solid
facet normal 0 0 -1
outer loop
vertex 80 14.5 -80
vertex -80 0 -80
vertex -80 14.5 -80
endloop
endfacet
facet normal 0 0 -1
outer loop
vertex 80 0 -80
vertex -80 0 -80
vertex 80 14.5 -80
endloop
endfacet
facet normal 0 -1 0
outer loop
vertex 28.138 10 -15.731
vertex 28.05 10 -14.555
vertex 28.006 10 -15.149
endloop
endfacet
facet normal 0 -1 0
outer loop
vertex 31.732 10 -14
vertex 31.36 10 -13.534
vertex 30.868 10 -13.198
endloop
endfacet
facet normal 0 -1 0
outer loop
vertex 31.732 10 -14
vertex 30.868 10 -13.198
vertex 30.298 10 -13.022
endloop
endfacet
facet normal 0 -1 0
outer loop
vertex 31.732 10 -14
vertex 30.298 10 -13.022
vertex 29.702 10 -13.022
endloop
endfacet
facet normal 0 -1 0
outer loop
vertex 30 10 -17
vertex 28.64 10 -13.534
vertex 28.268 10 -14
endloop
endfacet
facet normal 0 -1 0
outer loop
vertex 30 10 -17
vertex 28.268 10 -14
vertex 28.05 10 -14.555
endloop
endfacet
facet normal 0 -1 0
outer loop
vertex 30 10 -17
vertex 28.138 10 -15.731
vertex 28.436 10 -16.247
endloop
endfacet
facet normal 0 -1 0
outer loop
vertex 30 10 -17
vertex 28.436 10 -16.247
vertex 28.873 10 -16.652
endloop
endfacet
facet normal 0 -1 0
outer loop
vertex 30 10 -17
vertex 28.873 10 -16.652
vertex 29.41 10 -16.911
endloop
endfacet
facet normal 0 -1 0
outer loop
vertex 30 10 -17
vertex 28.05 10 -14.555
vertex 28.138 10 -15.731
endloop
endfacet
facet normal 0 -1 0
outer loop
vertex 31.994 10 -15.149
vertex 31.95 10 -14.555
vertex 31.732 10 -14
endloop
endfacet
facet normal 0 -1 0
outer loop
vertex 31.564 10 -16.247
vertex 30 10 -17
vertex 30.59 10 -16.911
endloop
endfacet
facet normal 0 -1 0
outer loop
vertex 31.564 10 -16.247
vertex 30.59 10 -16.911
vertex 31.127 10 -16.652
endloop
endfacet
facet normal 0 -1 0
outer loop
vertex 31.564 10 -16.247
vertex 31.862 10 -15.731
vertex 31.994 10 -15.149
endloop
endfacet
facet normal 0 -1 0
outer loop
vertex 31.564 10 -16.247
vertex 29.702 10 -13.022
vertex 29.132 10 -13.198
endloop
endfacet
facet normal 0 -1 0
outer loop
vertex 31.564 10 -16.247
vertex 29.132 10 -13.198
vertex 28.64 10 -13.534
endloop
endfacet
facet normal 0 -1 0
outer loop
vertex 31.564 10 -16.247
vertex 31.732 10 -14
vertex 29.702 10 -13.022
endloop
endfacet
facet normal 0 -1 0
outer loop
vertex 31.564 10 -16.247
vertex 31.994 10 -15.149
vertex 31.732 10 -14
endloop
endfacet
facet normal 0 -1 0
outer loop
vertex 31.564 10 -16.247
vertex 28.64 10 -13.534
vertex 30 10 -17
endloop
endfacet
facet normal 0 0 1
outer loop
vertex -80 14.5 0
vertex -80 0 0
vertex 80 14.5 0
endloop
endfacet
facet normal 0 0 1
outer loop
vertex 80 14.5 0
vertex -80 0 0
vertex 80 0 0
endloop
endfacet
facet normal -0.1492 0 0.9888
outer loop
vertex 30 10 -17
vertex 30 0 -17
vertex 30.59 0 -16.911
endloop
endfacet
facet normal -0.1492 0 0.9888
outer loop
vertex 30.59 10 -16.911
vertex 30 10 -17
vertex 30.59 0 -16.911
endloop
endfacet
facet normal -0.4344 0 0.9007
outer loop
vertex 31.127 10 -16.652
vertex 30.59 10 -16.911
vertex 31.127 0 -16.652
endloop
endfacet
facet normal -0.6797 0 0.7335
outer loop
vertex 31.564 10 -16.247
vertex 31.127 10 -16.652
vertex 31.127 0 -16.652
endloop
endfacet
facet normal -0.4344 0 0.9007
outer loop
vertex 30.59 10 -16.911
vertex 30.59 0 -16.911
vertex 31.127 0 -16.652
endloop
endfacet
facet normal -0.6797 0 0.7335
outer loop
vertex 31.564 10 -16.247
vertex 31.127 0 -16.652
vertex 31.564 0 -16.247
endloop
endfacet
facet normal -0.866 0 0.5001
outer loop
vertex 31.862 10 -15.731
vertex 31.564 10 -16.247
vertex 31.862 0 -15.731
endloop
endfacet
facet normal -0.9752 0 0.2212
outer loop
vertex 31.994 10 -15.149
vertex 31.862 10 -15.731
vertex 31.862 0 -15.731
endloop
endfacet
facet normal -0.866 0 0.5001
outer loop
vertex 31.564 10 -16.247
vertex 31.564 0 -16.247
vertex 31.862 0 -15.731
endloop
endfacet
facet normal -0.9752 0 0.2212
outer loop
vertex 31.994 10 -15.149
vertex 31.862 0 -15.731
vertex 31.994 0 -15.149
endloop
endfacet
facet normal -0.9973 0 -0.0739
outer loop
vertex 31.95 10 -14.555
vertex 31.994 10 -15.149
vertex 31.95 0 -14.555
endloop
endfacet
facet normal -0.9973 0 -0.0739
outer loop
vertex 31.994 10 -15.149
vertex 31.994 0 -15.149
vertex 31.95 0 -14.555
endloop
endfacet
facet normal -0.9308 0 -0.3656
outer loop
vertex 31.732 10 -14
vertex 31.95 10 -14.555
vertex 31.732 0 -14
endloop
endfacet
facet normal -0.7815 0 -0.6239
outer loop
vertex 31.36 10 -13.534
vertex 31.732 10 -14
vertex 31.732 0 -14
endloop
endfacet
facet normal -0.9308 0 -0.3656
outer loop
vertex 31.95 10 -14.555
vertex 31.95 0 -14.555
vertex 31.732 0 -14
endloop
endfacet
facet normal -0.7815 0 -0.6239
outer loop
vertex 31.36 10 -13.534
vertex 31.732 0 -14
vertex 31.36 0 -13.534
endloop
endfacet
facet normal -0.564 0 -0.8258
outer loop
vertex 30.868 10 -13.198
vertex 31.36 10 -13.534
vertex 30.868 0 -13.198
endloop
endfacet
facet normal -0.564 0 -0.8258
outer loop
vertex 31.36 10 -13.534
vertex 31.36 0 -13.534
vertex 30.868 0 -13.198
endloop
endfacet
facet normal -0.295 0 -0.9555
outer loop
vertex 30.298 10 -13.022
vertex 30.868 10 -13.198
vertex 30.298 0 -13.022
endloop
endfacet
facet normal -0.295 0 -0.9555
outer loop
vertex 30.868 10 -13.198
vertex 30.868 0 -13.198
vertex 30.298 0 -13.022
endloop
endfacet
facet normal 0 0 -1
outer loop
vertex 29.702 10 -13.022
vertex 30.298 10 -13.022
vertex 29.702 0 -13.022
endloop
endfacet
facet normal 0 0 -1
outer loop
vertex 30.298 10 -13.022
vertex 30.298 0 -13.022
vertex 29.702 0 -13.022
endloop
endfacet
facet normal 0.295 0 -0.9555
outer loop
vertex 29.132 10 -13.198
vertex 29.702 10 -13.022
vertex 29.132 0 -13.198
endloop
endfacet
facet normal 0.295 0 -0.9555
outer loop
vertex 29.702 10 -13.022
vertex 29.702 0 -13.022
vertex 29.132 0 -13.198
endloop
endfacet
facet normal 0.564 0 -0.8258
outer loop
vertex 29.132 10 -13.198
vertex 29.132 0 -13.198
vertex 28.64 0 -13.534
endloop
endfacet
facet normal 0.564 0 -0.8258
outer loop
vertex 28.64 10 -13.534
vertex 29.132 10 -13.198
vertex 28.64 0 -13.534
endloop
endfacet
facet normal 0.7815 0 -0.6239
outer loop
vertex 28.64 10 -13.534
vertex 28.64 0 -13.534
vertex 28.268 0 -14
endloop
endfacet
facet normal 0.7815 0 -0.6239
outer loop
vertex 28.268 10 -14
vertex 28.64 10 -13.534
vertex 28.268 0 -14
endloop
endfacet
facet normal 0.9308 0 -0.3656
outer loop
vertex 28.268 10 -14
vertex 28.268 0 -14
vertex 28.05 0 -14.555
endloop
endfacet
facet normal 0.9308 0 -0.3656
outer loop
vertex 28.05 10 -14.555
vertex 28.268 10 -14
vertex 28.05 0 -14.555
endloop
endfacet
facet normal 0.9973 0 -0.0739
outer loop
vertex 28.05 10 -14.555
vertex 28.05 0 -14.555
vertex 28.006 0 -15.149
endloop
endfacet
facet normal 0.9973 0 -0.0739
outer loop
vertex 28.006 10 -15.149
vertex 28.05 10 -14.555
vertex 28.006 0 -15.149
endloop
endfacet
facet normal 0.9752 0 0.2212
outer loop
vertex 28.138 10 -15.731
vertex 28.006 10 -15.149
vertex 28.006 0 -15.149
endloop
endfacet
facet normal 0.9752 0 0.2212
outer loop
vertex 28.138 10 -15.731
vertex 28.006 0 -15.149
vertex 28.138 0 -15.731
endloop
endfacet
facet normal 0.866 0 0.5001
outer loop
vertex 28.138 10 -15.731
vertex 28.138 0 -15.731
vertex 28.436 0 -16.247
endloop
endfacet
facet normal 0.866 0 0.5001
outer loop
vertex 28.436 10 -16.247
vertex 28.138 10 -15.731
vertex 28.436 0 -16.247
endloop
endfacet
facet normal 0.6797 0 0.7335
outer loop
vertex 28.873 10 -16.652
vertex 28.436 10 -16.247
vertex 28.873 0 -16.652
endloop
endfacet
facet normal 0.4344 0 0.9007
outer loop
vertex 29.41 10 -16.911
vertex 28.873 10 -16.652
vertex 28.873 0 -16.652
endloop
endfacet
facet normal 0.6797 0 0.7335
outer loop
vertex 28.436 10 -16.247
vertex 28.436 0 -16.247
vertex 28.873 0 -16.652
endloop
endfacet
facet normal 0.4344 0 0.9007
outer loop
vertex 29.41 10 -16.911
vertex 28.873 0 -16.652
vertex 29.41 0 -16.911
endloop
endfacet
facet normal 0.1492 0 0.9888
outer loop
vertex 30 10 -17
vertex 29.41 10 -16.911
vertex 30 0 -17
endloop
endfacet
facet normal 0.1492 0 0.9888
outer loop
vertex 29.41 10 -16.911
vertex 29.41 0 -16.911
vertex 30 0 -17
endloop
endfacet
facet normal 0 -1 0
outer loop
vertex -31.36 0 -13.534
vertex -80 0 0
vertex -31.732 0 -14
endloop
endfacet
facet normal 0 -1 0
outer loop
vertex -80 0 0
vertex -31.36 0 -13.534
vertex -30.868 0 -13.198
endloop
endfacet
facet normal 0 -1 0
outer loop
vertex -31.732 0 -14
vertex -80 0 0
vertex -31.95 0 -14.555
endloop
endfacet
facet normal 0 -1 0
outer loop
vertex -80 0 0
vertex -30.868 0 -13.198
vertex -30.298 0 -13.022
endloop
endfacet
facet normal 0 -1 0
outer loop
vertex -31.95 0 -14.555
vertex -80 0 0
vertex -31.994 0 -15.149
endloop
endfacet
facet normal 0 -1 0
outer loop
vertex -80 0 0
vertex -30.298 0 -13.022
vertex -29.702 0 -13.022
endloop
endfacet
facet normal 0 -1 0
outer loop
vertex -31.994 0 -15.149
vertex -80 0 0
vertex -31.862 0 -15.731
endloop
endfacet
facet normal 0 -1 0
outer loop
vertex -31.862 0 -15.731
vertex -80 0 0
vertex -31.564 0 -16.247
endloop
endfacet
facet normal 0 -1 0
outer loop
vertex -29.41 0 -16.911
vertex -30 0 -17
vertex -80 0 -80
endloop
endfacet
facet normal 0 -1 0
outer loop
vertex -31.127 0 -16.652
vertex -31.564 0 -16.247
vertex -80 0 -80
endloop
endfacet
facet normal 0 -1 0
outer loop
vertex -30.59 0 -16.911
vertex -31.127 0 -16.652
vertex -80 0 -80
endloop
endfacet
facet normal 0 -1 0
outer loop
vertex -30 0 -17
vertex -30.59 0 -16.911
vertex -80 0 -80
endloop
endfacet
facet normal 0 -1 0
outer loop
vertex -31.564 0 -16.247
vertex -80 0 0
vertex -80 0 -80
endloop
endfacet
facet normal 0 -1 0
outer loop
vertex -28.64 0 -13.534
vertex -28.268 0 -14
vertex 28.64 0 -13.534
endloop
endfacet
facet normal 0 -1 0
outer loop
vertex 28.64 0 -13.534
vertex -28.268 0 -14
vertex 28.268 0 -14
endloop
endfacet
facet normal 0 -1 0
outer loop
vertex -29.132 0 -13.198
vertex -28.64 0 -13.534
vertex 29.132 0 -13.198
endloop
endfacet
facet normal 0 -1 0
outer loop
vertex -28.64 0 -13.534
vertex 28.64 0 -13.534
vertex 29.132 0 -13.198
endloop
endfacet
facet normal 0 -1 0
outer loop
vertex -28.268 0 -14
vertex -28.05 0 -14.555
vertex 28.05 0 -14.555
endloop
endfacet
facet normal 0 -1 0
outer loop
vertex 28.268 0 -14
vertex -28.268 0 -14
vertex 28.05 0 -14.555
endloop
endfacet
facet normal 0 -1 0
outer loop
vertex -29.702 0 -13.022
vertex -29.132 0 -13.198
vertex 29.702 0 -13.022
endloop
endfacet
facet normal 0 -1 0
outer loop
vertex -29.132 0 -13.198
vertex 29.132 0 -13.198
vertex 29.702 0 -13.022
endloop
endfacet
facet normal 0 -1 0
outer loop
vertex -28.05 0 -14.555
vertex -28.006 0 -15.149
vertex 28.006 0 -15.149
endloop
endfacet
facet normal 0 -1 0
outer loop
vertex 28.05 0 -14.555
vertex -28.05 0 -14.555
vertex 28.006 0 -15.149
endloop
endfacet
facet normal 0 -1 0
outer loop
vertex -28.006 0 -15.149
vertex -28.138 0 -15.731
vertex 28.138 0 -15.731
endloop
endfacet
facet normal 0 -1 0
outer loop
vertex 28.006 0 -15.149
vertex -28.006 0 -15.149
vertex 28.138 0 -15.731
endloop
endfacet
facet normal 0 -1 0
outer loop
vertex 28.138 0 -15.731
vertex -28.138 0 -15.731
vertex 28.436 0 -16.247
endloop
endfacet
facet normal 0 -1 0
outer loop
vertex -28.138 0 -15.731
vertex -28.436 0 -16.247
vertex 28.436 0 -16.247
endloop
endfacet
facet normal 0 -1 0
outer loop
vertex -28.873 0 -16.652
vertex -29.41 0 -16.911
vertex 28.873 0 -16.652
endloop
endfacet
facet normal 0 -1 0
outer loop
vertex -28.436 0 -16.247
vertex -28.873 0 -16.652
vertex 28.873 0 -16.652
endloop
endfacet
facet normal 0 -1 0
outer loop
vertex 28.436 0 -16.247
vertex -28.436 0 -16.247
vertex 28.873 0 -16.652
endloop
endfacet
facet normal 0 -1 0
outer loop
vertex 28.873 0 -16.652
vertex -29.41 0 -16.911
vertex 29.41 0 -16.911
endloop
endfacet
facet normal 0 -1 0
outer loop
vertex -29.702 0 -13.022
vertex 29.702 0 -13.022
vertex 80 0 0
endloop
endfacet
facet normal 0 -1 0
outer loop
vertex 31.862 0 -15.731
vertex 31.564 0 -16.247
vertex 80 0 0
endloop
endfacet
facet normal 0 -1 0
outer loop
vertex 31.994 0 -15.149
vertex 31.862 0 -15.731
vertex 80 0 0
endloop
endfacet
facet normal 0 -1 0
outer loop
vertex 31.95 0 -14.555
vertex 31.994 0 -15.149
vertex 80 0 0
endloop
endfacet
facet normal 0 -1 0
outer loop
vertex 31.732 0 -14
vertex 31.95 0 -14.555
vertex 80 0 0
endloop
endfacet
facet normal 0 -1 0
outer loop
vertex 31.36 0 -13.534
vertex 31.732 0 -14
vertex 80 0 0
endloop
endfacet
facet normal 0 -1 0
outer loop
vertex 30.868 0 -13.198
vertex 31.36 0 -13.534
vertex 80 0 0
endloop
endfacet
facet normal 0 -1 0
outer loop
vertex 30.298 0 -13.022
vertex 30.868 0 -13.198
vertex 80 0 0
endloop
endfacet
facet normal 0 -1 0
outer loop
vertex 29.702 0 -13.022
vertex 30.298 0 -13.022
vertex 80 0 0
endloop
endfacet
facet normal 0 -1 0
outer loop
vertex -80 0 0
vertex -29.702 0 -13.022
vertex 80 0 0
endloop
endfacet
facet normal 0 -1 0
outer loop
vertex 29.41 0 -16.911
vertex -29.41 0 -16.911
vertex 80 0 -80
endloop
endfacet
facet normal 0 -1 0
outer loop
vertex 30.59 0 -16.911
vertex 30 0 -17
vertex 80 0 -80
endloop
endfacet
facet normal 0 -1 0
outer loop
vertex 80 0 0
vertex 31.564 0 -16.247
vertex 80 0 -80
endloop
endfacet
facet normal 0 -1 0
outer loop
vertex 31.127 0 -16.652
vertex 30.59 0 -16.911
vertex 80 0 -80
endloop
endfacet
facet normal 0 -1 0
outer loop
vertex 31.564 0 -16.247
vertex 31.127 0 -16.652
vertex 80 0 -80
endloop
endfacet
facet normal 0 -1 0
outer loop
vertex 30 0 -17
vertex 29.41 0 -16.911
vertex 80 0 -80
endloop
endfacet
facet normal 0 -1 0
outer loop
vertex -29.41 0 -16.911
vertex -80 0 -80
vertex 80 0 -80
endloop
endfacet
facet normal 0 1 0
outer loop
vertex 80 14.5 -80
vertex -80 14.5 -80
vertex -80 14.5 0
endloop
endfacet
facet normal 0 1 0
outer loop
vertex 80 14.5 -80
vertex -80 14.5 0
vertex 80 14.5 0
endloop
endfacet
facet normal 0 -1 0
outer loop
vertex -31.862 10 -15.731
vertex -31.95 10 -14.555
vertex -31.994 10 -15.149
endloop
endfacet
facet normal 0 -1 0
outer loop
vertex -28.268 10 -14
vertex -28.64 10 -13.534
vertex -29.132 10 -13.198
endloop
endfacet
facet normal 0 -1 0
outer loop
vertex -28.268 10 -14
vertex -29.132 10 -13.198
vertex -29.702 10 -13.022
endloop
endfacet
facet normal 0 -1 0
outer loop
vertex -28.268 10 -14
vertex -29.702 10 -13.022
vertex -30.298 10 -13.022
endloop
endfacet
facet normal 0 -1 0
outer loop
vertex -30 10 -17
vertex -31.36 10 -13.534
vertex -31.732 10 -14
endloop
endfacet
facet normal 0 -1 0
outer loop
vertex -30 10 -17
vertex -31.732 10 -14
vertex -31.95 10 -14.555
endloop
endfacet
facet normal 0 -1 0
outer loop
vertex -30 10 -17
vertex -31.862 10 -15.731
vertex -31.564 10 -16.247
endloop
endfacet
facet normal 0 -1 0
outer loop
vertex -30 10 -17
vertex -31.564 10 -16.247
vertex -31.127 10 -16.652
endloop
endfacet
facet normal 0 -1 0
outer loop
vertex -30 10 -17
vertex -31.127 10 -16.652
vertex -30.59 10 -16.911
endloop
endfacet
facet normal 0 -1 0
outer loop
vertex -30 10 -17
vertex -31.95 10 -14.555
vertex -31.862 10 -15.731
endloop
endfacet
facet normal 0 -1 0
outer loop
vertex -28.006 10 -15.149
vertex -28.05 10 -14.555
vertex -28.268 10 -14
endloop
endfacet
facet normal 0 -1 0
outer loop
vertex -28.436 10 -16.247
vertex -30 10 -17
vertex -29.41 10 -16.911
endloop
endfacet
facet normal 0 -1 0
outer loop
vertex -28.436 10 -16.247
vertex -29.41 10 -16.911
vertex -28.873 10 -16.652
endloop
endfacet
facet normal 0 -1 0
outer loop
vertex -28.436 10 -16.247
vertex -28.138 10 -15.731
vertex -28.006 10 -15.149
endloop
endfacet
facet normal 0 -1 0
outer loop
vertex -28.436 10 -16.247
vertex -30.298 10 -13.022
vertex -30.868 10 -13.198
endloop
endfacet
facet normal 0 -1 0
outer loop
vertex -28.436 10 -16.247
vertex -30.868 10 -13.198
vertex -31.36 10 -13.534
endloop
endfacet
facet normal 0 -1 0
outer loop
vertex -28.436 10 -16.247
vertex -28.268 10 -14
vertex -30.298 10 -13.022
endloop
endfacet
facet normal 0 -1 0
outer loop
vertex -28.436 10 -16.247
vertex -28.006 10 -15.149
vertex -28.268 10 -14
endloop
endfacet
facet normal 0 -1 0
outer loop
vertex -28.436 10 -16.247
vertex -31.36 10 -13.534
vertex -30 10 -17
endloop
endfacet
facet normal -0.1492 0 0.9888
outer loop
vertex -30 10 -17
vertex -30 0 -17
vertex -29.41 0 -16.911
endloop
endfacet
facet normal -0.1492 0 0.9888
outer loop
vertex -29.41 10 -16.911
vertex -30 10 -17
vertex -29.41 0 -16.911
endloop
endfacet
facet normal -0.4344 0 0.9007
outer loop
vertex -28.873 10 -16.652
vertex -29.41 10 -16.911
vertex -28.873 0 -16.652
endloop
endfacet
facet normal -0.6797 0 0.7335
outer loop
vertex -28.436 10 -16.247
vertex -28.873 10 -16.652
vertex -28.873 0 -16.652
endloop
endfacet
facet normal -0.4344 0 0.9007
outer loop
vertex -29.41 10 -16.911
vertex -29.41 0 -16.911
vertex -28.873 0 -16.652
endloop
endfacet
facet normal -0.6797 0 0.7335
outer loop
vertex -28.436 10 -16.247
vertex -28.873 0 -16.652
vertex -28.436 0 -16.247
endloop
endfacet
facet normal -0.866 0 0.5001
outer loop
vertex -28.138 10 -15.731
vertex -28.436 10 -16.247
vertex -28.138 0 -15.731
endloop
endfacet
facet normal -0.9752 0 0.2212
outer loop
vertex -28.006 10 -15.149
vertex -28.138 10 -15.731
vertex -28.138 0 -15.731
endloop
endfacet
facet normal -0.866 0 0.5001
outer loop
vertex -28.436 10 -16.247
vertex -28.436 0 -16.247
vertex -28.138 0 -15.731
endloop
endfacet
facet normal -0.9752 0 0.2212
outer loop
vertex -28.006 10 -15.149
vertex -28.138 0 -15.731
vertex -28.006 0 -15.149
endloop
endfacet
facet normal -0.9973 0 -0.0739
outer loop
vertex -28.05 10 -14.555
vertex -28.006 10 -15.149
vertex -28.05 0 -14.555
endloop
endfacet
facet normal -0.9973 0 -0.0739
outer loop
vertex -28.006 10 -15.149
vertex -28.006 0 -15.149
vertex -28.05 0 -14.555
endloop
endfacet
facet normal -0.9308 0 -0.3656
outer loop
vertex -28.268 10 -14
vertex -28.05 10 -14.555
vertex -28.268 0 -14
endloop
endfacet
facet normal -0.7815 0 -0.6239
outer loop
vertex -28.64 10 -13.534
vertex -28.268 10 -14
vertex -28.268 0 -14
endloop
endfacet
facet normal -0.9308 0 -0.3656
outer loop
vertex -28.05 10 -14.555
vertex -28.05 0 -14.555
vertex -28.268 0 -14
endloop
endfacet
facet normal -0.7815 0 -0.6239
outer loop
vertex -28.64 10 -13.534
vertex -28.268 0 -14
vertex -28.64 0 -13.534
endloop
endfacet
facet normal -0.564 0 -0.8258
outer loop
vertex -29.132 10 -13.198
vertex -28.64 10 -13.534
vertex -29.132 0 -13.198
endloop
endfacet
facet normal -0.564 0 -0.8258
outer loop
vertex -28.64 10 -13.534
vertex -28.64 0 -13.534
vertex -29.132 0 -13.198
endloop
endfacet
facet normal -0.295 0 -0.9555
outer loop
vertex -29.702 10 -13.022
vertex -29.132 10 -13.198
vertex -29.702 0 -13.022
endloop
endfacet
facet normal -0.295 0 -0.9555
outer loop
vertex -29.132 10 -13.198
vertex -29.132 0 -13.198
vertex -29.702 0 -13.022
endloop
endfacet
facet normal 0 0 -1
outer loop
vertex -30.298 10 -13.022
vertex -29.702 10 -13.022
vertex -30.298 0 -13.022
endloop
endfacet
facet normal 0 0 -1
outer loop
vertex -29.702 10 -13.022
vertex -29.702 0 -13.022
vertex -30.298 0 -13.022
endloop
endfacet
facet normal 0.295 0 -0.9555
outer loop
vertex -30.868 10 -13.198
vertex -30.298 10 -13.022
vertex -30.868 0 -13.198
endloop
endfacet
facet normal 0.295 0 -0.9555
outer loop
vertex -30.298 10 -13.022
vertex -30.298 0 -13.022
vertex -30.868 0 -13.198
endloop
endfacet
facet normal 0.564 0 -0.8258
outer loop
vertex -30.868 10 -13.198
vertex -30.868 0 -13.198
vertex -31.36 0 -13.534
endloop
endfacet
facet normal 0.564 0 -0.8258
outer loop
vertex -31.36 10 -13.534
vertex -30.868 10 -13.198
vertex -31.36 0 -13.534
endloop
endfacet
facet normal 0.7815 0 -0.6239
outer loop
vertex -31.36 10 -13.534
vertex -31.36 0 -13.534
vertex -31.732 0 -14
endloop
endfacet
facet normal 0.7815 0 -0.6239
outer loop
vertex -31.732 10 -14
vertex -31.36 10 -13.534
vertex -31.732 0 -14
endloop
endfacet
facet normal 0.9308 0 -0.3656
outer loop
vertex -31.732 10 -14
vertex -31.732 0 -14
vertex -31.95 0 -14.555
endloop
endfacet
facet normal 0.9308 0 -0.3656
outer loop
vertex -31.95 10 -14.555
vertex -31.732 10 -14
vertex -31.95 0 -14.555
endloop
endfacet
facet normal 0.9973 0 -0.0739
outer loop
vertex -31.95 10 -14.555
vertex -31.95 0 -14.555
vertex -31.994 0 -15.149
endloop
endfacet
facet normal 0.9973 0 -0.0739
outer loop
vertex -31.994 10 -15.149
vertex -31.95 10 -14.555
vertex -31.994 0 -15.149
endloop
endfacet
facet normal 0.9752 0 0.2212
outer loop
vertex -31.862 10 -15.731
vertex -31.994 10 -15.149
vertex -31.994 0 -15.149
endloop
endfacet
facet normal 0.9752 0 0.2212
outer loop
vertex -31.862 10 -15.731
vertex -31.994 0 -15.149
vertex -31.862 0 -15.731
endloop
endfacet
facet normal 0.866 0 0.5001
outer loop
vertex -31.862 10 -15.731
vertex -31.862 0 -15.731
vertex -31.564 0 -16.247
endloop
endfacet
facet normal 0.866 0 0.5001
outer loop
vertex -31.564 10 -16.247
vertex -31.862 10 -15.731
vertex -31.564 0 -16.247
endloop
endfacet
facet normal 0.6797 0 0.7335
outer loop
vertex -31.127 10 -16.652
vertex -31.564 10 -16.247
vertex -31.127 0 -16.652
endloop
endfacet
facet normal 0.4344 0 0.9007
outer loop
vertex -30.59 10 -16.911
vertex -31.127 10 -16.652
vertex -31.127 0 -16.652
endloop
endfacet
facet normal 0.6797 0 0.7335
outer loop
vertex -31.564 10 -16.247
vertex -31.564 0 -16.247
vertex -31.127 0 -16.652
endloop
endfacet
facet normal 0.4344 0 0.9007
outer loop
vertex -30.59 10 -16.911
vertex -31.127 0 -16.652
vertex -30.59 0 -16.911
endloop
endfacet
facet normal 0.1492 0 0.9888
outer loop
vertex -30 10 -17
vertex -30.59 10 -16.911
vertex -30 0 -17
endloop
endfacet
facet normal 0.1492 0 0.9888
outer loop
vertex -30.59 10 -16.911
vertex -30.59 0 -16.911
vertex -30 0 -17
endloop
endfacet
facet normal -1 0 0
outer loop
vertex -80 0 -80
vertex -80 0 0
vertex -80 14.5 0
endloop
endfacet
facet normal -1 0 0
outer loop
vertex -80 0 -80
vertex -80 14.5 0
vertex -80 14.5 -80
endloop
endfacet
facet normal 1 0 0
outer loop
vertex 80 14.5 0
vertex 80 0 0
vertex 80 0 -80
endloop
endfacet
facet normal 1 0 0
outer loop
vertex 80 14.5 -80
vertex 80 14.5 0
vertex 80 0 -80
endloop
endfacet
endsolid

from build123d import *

# Parameters (mm, degrees)
SKETCH_1_W          = 160
SKETCH_1_H          = 80
EXTRUDE_1_DEPTH     = 14.5
SKETCH_3_R          = 2
CUT_EXTRUDE_1_DEPTH = 10


with BuildPart() as part:
    # 草图1 → 凸台-拉伸1 (new body)
    with BuildSketch(Plane(origin=(0, 0, 0), x_dir=(1, 0, 0), z_dir=(0, 1, 0))):
        with Locations((0, 40)):
            Rectangle(SKETCH_1_W, SKETCH_1_H)
    extrude(amount=EXTRUDE_1_DEPTH)

    # 草图3 → 切除-拉伸1 (cut)
    with BuildSketch(Plane.XZ):
        with Locations(Location((-30, -15, 0), (0, 0, 270))):
            Circle(SKETCH_3_R)
        with Locations(Location((30, -15, 0), (0, 0, 270))):
            Circle(SKETCH_3_R)
    extrude(amount=-CUT_EXTRUDE_1_DEPTH, mode=Mode.SUBTRACT)


solid = part.part
